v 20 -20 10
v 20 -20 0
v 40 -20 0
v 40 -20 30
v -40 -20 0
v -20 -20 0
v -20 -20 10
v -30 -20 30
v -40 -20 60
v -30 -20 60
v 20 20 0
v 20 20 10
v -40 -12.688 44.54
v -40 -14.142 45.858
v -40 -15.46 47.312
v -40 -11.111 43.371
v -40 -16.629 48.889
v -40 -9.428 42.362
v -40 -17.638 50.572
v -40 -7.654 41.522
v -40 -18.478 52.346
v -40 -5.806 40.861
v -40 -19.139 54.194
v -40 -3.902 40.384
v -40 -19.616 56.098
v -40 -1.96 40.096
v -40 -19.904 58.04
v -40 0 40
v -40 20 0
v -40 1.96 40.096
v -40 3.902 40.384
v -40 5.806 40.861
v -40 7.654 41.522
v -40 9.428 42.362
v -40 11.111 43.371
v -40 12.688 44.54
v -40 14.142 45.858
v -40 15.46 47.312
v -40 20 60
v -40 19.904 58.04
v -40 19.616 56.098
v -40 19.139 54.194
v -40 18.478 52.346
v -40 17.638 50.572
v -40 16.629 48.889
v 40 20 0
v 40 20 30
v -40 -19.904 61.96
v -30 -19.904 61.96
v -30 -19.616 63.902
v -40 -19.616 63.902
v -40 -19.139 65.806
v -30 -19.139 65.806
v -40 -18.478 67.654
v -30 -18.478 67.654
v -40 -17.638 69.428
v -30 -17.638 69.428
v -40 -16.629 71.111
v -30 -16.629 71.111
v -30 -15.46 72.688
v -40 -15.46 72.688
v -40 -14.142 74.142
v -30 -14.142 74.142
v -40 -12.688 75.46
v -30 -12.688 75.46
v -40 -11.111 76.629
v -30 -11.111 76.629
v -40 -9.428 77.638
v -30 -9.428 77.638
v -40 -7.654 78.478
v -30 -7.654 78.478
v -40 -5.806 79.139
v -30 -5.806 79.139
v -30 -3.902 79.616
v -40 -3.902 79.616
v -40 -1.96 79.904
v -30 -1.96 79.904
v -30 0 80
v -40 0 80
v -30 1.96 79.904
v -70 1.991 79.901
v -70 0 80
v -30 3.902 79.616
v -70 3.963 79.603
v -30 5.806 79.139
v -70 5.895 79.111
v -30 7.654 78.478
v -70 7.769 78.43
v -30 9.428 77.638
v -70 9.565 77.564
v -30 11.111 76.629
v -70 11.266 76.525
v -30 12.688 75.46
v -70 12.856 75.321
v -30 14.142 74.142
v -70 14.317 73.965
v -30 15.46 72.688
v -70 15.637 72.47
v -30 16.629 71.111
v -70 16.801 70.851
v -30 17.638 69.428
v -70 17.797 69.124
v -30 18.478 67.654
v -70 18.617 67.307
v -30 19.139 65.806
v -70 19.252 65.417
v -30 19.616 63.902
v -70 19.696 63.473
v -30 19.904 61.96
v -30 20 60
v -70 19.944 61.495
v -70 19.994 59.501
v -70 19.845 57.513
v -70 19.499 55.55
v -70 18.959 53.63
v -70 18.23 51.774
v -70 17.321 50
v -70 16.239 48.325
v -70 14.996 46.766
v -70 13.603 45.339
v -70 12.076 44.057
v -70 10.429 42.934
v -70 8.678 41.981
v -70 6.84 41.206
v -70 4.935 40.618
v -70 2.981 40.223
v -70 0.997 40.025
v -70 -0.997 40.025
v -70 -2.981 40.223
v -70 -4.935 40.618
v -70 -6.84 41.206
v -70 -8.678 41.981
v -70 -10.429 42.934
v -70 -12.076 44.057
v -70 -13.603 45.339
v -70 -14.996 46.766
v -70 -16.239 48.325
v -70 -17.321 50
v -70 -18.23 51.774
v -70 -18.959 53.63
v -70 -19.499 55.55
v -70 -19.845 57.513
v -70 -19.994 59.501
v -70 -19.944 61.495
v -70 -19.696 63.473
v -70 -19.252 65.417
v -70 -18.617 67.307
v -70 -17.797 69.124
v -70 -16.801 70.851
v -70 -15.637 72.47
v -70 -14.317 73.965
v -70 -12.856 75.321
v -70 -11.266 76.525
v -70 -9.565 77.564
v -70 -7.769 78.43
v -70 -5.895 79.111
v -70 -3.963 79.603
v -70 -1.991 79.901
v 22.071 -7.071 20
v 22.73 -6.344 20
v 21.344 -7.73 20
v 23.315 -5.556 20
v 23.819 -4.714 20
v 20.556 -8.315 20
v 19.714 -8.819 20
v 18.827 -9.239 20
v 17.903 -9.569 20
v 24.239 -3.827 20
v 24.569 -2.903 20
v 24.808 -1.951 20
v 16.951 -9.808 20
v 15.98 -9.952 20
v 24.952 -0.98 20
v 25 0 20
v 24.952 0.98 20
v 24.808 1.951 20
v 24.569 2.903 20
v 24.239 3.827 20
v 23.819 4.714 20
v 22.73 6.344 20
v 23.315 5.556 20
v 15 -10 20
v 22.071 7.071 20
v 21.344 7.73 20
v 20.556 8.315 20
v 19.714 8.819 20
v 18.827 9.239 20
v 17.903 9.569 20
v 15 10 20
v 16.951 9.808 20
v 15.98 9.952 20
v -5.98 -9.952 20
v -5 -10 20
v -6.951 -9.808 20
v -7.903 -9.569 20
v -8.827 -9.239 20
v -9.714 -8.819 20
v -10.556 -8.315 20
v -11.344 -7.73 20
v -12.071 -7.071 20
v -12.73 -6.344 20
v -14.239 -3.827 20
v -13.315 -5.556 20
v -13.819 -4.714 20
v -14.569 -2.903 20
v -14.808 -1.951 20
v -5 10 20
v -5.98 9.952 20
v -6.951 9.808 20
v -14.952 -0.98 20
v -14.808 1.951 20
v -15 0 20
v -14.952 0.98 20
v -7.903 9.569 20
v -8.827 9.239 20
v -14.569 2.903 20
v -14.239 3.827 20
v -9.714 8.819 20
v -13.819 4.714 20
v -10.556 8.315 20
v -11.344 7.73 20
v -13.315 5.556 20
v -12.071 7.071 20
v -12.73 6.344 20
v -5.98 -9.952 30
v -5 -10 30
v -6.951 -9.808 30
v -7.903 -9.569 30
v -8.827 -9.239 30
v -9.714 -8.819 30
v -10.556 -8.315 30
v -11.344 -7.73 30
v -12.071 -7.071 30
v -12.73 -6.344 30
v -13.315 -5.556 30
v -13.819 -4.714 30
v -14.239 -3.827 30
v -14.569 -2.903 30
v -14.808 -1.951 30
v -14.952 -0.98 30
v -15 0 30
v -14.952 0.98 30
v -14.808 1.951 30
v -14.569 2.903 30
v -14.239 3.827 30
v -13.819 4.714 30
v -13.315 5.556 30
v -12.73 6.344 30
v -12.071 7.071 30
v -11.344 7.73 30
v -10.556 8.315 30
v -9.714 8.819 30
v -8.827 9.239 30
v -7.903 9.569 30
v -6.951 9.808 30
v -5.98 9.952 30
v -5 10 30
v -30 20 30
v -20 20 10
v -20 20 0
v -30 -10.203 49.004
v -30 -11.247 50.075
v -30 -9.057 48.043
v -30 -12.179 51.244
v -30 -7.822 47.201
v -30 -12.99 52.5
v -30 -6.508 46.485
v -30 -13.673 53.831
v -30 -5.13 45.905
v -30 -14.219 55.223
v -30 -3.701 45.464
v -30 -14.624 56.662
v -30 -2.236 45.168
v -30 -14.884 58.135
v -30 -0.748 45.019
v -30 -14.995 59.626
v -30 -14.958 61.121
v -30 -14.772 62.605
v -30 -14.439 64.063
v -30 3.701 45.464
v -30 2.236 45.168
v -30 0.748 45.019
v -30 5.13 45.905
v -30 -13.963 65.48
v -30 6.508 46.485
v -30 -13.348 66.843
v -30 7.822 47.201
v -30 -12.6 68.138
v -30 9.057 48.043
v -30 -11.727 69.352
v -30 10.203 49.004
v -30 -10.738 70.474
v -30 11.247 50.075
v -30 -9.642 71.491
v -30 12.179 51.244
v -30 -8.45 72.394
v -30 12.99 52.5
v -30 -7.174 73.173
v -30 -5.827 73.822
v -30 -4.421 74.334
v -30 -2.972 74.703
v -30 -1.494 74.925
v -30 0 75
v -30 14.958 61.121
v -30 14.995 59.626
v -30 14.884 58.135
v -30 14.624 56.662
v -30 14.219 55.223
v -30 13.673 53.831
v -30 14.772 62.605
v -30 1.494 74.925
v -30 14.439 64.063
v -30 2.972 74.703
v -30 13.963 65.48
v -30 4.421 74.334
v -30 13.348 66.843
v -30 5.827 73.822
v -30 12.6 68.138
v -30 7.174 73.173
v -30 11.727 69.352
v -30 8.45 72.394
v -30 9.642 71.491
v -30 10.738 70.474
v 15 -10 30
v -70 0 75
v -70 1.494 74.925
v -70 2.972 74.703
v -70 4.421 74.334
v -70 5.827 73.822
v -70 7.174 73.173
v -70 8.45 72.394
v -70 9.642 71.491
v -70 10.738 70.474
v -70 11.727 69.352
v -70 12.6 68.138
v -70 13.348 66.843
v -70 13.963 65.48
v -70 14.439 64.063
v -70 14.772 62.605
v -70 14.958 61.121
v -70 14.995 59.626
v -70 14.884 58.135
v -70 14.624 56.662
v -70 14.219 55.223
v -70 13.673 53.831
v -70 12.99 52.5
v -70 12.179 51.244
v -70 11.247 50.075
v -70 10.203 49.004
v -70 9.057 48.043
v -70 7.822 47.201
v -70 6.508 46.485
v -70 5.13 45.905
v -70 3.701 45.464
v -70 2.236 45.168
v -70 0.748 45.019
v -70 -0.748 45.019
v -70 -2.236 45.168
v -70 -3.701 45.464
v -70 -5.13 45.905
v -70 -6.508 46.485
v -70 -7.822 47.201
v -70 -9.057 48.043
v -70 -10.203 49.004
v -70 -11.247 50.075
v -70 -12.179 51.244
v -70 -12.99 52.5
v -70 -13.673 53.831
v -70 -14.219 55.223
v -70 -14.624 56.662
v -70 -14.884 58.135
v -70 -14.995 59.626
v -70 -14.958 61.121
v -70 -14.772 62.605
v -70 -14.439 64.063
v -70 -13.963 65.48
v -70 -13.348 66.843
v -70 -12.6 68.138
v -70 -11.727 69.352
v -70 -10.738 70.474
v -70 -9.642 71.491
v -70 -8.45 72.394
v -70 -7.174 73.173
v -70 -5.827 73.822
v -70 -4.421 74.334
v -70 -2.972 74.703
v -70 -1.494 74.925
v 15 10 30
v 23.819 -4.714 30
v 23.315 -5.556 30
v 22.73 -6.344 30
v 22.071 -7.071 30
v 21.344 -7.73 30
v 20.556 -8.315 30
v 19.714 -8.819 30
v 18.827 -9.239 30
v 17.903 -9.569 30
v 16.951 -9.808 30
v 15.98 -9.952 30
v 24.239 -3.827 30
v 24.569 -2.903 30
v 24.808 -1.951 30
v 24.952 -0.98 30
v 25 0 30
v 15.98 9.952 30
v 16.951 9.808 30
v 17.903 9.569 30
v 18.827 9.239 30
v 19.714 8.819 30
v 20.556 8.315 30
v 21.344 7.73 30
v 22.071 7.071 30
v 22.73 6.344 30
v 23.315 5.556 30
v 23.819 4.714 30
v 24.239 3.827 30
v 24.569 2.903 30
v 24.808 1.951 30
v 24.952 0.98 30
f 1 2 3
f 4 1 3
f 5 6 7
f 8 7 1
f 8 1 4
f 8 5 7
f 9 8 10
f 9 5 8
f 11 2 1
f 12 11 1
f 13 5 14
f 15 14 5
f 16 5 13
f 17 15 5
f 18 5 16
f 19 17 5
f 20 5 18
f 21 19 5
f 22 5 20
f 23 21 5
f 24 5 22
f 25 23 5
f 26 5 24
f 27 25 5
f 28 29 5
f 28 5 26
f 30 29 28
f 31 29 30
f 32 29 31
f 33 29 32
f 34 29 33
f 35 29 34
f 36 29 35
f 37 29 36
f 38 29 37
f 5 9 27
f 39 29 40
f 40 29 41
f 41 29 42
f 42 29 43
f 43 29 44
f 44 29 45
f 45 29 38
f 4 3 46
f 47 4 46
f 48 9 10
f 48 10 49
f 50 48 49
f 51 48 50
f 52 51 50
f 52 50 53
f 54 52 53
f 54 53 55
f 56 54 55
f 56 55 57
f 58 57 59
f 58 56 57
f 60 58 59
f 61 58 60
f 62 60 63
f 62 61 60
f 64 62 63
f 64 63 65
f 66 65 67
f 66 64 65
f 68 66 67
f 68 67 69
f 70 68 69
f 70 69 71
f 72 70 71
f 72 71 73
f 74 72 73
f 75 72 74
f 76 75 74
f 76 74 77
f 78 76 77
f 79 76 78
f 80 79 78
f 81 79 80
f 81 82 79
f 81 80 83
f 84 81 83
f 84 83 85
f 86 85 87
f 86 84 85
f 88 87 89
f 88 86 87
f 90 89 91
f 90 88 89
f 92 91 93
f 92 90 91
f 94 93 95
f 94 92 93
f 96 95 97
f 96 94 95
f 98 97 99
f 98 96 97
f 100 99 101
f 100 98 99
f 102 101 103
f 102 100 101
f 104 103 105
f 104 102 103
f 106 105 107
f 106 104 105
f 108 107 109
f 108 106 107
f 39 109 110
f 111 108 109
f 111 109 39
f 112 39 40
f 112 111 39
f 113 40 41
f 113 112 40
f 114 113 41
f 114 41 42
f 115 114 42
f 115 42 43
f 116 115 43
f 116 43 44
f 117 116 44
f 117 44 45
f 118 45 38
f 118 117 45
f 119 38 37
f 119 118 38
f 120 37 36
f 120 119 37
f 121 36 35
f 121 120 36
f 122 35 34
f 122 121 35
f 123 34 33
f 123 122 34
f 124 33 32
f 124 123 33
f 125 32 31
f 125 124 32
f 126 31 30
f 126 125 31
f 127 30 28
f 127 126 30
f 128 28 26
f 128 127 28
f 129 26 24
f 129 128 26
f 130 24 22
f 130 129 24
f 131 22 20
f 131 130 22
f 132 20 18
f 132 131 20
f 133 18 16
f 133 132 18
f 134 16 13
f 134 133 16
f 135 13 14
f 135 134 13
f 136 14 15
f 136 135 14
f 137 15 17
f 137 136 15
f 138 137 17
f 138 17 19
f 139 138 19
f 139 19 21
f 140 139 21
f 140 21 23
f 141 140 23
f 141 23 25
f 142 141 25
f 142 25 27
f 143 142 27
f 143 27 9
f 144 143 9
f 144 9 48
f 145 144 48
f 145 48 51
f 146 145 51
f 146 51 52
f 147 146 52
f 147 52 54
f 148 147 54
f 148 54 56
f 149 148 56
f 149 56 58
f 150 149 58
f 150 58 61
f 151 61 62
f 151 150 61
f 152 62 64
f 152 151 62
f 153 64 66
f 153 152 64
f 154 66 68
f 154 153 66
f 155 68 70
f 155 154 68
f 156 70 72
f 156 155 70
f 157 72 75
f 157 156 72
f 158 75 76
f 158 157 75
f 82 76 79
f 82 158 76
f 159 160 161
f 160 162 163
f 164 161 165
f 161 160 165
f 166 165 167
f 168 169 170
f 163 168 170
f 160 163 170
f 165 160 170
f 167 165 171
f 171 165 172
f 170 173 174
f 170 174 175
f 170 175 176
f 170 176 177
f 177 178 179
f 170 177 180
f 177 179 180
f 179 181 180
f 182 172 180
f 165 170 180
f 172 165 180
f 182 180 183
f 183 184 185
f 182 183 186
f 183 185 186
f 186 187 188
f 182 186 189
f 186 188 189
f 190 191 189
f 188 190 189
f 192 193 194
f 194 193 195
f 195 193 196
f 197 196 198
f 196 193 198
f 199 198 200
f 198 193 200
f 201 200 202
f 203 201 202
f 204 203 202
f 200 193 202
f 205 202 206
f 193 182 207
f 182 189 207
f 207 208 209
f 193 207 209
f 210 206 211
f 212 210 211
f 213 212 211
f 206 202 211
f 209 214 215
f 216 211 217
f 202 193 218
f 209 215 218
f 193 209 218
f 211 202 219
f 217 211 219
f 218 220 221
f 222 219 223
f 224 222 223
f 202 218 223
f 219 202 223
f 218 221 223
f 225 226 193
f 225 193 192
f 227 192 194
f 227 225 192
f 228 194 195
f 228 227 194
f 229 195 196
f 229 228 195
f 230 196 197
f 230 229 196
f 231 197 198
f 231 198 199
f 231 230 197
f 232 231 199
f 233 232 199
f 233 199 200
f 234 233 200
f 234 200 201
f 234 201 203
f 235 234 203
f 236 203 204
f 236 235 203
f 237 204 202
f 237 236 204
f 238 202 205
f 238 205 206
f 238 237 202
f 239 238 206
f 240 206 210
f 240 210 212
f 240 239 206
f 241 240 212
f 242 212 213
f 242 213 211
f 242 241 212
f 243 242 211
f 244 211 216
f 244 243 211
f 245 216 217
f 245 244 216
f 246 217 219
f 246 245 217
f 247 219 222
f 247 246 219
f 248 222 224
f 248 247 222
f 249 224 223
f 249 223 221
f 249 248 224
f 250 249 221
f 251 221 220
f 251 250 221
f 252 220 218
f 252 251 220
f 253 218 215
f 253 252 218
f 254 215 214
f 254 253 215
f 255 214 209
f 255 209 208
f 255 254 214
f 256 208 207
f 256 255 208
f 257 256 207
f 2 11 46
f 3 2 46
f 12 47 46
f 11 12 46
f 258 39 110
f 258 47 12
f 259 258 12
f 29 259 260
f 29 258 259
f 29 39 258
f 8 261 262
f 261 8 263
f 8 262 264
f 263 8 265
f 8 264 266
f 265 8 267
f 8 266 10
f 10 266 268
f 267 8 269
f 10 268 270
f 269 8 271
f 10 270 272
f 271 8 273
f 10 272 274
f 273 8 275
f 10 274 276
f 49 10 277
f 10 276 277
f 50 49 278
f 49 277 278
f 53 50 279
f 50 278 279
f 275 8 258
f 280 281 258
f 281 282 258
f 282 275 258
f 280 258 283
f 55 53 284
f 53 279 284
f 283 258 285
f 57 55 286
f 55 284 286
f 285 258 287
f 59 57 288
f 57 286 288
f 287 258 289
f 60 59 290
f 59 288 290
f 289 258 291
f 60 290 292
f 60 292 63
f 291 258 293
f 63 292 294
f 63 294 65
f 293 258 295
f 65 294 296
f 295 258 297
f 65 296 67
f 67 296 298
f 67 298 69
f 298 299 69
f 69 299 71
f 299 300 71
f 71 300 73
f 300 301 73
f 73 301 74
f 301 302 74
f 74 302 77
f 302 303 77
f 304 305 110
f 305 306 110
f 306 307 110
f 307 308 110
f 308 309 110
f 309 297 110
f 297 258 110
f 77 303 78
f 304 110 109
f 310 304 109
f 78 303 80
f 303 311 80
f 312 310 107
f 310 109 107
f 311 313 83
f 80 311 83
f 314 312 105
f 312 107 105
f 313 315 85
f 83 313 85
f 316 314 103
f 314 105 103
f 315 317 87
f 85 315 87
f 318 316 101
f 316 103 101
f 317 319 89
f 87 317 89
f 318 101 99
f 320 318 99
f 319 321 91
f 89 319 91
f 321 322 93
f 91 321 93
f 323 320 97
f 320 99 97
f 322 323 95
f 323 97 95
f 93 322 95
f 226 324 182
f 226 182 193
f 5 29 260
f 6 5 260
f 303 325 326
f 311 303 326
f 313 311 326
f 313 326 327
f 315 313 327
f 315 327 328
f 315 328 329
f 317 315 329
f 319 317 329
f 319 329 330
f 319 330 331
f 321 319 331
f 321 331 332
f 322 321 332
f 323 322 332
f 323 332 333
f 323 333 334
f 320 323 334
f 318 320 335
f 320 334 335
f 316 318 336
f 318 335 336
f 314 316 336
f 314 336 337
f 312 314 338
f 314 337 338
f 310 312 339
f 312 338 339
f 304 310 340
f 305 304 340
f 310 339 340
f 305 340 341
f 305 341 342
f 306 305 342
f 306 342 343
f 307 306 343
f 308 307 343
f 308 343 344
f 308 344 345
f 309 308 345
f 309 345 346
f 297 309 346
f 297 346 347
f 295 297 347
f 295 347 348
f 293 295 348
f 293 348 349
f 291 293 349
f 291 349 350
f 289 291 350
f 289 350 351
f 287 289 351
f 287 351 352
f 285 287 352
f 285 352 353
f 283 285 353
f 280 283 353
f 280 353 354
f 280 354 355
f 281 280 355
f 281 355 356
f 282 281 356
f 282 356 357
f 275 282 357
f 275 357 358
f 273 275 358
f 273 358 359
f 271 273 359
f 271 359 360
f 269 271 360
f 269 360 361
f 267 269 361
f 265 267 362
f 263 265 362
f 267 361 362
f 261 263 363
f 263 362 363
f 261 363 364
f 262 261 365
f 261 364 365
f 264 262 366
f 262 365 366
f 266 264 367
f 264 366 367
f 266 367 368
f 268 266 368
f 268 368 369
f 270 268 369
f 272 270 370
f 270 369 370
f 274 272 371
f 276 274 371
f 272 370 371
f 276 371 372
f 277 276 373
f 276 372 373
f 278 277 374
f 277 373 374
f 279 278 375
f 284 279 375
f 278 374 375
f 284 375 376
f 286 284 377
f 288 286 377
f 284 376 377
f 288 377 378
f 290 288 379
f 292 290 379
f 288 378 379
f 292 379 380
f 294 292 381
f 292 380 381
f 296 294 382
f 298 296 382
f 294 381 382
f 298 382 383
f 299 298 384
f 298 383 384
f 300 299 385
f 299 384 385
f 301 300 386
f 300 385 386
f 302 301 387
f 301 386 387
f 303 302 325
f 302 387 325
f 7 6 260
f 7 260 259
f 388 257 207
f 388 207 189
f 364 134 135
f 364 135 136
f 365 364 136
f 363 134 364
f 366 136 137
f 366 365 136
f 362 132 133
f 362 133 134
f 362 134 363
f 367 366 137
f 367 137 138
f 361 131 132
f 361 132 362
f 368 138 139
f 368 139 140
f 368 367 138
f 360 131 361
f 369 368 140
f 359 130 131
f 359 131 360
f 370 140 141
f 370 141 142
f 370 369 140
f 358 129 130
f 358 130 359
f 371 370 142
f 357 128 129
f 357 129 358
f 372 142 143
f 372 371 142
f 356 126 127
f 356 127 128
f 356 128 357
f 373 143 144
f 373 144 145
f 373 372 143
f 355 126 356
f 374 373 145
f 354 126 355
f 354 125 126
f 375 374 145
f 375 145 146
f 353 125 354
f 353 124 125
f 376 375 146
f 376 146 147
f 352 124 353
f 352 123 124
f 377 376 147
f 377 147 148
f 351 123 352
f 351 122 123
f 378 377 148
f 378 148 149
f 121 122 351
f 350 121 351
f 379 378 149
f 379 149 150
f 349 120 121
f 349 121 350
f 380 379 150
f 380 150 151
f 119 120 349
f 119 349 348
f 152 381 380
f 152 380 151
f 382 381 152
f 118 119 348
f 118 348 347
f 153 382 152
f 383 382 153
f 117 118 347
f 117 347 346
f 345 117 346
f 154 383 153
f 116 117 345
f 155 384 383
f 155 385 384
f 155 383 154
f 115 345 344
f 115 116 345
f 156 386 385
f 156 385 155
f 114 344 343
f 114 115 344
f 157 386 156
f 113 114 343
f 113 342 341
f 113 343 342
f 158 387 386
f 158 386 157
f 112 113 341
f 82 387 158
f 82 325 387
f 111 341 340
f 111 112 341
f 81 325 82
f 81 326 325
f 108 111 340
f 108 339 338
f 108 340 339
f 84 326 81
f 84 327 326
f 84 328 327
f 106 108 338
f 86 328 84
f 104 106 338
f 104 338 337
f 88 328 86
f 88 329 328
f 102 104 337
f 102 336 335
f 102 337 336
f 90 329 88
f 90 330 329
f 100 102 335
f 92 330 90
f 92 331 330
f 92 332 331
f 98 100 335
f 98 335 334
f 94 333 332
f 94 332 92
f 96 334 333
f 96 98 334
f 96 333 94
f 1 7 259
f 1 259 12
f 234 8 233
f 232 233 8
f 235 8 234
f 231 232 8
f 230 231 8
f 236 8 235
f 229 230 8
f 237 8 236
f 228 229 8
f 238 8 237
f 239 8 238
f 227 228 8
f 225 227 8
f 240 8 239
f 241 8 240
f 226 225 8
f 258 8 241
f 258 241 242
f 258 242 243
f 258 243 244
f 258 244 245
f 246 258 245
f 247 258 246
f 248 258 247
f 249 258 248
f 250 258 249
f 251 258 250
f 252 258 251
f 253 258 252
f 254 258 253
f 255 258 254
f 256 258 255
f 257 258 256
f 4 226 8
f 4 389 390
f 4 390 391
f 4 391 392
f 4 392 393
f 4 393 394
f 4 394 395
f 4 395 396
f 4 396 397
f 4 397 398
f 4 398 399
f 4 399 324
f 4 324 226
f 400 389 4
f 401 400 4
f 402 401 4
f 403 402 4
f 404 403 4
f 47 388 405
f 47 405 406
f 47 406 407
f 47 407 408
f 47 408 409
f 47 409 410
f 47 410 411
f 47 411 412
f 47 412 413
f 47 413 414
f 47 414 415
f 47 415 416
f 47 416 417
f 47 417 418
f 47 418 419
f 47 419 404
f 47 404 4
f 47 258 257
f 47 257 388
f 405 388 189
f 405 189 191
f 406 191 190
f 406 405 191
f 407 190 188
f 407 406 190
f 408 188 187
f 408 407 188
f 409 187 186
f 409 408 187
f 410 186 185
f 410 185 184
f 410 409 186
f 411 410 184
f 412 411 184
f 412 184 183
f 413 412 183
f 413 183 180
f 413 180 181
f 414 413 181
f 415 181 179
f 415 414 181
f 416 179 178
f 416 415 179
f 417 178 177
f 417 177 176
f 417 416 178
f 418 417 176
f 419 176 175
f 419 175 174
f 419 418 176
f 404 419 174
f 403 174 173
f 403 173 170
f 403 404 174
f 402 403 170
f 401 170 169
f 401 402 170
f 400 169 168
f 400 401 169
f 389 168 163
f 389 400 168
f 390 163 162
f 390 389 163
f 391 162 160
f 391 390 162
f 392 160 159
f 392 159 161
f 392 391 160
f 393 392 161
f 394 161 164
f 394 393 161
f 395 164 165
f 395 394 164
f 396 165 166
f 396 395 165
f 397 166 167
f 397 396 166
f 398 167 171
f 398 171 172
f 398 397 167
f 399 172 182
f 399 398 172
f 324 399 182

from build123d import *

# Parameters (mm, degrees)
SKETCH_1_W          = 80
SKETCH_1_H          = 40
EXTRUDE_1_DEPTH     = 30
SKETCH_2_W          = 40
SKETCH_2_H          = 13.147576883
CUT_EXTRUDE_1_DEPTH = 65.031242374
CUT_EXTRUDE_2_DEPTH = 10
SKETCH_5_R          = 15
EXTRUDE_2_DEPTH     = 10
EXTRUDE_START       = 30
SKETCH_6_R          = 20
SKETCH_6_R_2        = 15
EXTRUDE_3_DEPTH     = 30


with BuildPart() as part:
    # 草圖1 → 填料-伸長1 (new body)
    with BuildSketch(Plane.XY):
        Rectangle(SKETCH_1_W, SKETCH_1_H)
    extrude(amount=EXTRUDE_1_DEPTH)

    # 草圖2 → 除料-伸長1 (cut, through all)
    with BuildSketch(Plane.XZ.offset(20)):
        with Locations((0, 3.426211558)):
            Rectangle(SKETCH_2_W, SKETCH_2_H)
    extrude(amount=-CUT_EXTRUDE_1_DEPTH, mode=Mode.SUBTRACT)

    # 草圖3 → 除料-伸長2 (cut)
    with BuildSketch(Plane.XY.offset(30)):
        with BuildLine():
            Line((15, -10), (-5, -10))
            ThreePointArc((-5, -10), (-15, 0), (-5, 10))
            Line((-5, 10), (15, 10))
            ThreePointArc((15, 10), (25, 0), (15, -10))
        make_face()
    extrude(amount=-CUT_EXTRUDE_2_DEPTH, mode=Mode.SUBTRACT)

    # 草圖5 → 填料-伸長2 (add)
    with BuildSketch(Plane.ZY.offset(40)):
        with BuildLine():
            Line((30, -20), (60, -20))
            ThreePointArc((60, -20), (80, 0), (60, 20))
            Line((60, 20), (30, 20))
            Line((30, 20), (30, -20))
        make_face()
        with Locations((60, 0)):
            Circle(SKETCH_5_R, mode=Mode.SUBTRACT)
    extrude(amount=-EXTRUDE_2_DEPTH)

    # 草圖6 → 填料-伸長3 (add)
    with BuildSketch(Plane.ZY.offset(40).offset(EXTRUDE_START)):
        with Locations((60, 0)):
            Circle(SKETCH_6_R)
        with Locations((60, 0)):
            Circle(SKETCH_6_R_2, mode=Mode.SUBTRACT)
    extrude(amount=-EXTRUDE_3_DEPTH)


solid = part.part
